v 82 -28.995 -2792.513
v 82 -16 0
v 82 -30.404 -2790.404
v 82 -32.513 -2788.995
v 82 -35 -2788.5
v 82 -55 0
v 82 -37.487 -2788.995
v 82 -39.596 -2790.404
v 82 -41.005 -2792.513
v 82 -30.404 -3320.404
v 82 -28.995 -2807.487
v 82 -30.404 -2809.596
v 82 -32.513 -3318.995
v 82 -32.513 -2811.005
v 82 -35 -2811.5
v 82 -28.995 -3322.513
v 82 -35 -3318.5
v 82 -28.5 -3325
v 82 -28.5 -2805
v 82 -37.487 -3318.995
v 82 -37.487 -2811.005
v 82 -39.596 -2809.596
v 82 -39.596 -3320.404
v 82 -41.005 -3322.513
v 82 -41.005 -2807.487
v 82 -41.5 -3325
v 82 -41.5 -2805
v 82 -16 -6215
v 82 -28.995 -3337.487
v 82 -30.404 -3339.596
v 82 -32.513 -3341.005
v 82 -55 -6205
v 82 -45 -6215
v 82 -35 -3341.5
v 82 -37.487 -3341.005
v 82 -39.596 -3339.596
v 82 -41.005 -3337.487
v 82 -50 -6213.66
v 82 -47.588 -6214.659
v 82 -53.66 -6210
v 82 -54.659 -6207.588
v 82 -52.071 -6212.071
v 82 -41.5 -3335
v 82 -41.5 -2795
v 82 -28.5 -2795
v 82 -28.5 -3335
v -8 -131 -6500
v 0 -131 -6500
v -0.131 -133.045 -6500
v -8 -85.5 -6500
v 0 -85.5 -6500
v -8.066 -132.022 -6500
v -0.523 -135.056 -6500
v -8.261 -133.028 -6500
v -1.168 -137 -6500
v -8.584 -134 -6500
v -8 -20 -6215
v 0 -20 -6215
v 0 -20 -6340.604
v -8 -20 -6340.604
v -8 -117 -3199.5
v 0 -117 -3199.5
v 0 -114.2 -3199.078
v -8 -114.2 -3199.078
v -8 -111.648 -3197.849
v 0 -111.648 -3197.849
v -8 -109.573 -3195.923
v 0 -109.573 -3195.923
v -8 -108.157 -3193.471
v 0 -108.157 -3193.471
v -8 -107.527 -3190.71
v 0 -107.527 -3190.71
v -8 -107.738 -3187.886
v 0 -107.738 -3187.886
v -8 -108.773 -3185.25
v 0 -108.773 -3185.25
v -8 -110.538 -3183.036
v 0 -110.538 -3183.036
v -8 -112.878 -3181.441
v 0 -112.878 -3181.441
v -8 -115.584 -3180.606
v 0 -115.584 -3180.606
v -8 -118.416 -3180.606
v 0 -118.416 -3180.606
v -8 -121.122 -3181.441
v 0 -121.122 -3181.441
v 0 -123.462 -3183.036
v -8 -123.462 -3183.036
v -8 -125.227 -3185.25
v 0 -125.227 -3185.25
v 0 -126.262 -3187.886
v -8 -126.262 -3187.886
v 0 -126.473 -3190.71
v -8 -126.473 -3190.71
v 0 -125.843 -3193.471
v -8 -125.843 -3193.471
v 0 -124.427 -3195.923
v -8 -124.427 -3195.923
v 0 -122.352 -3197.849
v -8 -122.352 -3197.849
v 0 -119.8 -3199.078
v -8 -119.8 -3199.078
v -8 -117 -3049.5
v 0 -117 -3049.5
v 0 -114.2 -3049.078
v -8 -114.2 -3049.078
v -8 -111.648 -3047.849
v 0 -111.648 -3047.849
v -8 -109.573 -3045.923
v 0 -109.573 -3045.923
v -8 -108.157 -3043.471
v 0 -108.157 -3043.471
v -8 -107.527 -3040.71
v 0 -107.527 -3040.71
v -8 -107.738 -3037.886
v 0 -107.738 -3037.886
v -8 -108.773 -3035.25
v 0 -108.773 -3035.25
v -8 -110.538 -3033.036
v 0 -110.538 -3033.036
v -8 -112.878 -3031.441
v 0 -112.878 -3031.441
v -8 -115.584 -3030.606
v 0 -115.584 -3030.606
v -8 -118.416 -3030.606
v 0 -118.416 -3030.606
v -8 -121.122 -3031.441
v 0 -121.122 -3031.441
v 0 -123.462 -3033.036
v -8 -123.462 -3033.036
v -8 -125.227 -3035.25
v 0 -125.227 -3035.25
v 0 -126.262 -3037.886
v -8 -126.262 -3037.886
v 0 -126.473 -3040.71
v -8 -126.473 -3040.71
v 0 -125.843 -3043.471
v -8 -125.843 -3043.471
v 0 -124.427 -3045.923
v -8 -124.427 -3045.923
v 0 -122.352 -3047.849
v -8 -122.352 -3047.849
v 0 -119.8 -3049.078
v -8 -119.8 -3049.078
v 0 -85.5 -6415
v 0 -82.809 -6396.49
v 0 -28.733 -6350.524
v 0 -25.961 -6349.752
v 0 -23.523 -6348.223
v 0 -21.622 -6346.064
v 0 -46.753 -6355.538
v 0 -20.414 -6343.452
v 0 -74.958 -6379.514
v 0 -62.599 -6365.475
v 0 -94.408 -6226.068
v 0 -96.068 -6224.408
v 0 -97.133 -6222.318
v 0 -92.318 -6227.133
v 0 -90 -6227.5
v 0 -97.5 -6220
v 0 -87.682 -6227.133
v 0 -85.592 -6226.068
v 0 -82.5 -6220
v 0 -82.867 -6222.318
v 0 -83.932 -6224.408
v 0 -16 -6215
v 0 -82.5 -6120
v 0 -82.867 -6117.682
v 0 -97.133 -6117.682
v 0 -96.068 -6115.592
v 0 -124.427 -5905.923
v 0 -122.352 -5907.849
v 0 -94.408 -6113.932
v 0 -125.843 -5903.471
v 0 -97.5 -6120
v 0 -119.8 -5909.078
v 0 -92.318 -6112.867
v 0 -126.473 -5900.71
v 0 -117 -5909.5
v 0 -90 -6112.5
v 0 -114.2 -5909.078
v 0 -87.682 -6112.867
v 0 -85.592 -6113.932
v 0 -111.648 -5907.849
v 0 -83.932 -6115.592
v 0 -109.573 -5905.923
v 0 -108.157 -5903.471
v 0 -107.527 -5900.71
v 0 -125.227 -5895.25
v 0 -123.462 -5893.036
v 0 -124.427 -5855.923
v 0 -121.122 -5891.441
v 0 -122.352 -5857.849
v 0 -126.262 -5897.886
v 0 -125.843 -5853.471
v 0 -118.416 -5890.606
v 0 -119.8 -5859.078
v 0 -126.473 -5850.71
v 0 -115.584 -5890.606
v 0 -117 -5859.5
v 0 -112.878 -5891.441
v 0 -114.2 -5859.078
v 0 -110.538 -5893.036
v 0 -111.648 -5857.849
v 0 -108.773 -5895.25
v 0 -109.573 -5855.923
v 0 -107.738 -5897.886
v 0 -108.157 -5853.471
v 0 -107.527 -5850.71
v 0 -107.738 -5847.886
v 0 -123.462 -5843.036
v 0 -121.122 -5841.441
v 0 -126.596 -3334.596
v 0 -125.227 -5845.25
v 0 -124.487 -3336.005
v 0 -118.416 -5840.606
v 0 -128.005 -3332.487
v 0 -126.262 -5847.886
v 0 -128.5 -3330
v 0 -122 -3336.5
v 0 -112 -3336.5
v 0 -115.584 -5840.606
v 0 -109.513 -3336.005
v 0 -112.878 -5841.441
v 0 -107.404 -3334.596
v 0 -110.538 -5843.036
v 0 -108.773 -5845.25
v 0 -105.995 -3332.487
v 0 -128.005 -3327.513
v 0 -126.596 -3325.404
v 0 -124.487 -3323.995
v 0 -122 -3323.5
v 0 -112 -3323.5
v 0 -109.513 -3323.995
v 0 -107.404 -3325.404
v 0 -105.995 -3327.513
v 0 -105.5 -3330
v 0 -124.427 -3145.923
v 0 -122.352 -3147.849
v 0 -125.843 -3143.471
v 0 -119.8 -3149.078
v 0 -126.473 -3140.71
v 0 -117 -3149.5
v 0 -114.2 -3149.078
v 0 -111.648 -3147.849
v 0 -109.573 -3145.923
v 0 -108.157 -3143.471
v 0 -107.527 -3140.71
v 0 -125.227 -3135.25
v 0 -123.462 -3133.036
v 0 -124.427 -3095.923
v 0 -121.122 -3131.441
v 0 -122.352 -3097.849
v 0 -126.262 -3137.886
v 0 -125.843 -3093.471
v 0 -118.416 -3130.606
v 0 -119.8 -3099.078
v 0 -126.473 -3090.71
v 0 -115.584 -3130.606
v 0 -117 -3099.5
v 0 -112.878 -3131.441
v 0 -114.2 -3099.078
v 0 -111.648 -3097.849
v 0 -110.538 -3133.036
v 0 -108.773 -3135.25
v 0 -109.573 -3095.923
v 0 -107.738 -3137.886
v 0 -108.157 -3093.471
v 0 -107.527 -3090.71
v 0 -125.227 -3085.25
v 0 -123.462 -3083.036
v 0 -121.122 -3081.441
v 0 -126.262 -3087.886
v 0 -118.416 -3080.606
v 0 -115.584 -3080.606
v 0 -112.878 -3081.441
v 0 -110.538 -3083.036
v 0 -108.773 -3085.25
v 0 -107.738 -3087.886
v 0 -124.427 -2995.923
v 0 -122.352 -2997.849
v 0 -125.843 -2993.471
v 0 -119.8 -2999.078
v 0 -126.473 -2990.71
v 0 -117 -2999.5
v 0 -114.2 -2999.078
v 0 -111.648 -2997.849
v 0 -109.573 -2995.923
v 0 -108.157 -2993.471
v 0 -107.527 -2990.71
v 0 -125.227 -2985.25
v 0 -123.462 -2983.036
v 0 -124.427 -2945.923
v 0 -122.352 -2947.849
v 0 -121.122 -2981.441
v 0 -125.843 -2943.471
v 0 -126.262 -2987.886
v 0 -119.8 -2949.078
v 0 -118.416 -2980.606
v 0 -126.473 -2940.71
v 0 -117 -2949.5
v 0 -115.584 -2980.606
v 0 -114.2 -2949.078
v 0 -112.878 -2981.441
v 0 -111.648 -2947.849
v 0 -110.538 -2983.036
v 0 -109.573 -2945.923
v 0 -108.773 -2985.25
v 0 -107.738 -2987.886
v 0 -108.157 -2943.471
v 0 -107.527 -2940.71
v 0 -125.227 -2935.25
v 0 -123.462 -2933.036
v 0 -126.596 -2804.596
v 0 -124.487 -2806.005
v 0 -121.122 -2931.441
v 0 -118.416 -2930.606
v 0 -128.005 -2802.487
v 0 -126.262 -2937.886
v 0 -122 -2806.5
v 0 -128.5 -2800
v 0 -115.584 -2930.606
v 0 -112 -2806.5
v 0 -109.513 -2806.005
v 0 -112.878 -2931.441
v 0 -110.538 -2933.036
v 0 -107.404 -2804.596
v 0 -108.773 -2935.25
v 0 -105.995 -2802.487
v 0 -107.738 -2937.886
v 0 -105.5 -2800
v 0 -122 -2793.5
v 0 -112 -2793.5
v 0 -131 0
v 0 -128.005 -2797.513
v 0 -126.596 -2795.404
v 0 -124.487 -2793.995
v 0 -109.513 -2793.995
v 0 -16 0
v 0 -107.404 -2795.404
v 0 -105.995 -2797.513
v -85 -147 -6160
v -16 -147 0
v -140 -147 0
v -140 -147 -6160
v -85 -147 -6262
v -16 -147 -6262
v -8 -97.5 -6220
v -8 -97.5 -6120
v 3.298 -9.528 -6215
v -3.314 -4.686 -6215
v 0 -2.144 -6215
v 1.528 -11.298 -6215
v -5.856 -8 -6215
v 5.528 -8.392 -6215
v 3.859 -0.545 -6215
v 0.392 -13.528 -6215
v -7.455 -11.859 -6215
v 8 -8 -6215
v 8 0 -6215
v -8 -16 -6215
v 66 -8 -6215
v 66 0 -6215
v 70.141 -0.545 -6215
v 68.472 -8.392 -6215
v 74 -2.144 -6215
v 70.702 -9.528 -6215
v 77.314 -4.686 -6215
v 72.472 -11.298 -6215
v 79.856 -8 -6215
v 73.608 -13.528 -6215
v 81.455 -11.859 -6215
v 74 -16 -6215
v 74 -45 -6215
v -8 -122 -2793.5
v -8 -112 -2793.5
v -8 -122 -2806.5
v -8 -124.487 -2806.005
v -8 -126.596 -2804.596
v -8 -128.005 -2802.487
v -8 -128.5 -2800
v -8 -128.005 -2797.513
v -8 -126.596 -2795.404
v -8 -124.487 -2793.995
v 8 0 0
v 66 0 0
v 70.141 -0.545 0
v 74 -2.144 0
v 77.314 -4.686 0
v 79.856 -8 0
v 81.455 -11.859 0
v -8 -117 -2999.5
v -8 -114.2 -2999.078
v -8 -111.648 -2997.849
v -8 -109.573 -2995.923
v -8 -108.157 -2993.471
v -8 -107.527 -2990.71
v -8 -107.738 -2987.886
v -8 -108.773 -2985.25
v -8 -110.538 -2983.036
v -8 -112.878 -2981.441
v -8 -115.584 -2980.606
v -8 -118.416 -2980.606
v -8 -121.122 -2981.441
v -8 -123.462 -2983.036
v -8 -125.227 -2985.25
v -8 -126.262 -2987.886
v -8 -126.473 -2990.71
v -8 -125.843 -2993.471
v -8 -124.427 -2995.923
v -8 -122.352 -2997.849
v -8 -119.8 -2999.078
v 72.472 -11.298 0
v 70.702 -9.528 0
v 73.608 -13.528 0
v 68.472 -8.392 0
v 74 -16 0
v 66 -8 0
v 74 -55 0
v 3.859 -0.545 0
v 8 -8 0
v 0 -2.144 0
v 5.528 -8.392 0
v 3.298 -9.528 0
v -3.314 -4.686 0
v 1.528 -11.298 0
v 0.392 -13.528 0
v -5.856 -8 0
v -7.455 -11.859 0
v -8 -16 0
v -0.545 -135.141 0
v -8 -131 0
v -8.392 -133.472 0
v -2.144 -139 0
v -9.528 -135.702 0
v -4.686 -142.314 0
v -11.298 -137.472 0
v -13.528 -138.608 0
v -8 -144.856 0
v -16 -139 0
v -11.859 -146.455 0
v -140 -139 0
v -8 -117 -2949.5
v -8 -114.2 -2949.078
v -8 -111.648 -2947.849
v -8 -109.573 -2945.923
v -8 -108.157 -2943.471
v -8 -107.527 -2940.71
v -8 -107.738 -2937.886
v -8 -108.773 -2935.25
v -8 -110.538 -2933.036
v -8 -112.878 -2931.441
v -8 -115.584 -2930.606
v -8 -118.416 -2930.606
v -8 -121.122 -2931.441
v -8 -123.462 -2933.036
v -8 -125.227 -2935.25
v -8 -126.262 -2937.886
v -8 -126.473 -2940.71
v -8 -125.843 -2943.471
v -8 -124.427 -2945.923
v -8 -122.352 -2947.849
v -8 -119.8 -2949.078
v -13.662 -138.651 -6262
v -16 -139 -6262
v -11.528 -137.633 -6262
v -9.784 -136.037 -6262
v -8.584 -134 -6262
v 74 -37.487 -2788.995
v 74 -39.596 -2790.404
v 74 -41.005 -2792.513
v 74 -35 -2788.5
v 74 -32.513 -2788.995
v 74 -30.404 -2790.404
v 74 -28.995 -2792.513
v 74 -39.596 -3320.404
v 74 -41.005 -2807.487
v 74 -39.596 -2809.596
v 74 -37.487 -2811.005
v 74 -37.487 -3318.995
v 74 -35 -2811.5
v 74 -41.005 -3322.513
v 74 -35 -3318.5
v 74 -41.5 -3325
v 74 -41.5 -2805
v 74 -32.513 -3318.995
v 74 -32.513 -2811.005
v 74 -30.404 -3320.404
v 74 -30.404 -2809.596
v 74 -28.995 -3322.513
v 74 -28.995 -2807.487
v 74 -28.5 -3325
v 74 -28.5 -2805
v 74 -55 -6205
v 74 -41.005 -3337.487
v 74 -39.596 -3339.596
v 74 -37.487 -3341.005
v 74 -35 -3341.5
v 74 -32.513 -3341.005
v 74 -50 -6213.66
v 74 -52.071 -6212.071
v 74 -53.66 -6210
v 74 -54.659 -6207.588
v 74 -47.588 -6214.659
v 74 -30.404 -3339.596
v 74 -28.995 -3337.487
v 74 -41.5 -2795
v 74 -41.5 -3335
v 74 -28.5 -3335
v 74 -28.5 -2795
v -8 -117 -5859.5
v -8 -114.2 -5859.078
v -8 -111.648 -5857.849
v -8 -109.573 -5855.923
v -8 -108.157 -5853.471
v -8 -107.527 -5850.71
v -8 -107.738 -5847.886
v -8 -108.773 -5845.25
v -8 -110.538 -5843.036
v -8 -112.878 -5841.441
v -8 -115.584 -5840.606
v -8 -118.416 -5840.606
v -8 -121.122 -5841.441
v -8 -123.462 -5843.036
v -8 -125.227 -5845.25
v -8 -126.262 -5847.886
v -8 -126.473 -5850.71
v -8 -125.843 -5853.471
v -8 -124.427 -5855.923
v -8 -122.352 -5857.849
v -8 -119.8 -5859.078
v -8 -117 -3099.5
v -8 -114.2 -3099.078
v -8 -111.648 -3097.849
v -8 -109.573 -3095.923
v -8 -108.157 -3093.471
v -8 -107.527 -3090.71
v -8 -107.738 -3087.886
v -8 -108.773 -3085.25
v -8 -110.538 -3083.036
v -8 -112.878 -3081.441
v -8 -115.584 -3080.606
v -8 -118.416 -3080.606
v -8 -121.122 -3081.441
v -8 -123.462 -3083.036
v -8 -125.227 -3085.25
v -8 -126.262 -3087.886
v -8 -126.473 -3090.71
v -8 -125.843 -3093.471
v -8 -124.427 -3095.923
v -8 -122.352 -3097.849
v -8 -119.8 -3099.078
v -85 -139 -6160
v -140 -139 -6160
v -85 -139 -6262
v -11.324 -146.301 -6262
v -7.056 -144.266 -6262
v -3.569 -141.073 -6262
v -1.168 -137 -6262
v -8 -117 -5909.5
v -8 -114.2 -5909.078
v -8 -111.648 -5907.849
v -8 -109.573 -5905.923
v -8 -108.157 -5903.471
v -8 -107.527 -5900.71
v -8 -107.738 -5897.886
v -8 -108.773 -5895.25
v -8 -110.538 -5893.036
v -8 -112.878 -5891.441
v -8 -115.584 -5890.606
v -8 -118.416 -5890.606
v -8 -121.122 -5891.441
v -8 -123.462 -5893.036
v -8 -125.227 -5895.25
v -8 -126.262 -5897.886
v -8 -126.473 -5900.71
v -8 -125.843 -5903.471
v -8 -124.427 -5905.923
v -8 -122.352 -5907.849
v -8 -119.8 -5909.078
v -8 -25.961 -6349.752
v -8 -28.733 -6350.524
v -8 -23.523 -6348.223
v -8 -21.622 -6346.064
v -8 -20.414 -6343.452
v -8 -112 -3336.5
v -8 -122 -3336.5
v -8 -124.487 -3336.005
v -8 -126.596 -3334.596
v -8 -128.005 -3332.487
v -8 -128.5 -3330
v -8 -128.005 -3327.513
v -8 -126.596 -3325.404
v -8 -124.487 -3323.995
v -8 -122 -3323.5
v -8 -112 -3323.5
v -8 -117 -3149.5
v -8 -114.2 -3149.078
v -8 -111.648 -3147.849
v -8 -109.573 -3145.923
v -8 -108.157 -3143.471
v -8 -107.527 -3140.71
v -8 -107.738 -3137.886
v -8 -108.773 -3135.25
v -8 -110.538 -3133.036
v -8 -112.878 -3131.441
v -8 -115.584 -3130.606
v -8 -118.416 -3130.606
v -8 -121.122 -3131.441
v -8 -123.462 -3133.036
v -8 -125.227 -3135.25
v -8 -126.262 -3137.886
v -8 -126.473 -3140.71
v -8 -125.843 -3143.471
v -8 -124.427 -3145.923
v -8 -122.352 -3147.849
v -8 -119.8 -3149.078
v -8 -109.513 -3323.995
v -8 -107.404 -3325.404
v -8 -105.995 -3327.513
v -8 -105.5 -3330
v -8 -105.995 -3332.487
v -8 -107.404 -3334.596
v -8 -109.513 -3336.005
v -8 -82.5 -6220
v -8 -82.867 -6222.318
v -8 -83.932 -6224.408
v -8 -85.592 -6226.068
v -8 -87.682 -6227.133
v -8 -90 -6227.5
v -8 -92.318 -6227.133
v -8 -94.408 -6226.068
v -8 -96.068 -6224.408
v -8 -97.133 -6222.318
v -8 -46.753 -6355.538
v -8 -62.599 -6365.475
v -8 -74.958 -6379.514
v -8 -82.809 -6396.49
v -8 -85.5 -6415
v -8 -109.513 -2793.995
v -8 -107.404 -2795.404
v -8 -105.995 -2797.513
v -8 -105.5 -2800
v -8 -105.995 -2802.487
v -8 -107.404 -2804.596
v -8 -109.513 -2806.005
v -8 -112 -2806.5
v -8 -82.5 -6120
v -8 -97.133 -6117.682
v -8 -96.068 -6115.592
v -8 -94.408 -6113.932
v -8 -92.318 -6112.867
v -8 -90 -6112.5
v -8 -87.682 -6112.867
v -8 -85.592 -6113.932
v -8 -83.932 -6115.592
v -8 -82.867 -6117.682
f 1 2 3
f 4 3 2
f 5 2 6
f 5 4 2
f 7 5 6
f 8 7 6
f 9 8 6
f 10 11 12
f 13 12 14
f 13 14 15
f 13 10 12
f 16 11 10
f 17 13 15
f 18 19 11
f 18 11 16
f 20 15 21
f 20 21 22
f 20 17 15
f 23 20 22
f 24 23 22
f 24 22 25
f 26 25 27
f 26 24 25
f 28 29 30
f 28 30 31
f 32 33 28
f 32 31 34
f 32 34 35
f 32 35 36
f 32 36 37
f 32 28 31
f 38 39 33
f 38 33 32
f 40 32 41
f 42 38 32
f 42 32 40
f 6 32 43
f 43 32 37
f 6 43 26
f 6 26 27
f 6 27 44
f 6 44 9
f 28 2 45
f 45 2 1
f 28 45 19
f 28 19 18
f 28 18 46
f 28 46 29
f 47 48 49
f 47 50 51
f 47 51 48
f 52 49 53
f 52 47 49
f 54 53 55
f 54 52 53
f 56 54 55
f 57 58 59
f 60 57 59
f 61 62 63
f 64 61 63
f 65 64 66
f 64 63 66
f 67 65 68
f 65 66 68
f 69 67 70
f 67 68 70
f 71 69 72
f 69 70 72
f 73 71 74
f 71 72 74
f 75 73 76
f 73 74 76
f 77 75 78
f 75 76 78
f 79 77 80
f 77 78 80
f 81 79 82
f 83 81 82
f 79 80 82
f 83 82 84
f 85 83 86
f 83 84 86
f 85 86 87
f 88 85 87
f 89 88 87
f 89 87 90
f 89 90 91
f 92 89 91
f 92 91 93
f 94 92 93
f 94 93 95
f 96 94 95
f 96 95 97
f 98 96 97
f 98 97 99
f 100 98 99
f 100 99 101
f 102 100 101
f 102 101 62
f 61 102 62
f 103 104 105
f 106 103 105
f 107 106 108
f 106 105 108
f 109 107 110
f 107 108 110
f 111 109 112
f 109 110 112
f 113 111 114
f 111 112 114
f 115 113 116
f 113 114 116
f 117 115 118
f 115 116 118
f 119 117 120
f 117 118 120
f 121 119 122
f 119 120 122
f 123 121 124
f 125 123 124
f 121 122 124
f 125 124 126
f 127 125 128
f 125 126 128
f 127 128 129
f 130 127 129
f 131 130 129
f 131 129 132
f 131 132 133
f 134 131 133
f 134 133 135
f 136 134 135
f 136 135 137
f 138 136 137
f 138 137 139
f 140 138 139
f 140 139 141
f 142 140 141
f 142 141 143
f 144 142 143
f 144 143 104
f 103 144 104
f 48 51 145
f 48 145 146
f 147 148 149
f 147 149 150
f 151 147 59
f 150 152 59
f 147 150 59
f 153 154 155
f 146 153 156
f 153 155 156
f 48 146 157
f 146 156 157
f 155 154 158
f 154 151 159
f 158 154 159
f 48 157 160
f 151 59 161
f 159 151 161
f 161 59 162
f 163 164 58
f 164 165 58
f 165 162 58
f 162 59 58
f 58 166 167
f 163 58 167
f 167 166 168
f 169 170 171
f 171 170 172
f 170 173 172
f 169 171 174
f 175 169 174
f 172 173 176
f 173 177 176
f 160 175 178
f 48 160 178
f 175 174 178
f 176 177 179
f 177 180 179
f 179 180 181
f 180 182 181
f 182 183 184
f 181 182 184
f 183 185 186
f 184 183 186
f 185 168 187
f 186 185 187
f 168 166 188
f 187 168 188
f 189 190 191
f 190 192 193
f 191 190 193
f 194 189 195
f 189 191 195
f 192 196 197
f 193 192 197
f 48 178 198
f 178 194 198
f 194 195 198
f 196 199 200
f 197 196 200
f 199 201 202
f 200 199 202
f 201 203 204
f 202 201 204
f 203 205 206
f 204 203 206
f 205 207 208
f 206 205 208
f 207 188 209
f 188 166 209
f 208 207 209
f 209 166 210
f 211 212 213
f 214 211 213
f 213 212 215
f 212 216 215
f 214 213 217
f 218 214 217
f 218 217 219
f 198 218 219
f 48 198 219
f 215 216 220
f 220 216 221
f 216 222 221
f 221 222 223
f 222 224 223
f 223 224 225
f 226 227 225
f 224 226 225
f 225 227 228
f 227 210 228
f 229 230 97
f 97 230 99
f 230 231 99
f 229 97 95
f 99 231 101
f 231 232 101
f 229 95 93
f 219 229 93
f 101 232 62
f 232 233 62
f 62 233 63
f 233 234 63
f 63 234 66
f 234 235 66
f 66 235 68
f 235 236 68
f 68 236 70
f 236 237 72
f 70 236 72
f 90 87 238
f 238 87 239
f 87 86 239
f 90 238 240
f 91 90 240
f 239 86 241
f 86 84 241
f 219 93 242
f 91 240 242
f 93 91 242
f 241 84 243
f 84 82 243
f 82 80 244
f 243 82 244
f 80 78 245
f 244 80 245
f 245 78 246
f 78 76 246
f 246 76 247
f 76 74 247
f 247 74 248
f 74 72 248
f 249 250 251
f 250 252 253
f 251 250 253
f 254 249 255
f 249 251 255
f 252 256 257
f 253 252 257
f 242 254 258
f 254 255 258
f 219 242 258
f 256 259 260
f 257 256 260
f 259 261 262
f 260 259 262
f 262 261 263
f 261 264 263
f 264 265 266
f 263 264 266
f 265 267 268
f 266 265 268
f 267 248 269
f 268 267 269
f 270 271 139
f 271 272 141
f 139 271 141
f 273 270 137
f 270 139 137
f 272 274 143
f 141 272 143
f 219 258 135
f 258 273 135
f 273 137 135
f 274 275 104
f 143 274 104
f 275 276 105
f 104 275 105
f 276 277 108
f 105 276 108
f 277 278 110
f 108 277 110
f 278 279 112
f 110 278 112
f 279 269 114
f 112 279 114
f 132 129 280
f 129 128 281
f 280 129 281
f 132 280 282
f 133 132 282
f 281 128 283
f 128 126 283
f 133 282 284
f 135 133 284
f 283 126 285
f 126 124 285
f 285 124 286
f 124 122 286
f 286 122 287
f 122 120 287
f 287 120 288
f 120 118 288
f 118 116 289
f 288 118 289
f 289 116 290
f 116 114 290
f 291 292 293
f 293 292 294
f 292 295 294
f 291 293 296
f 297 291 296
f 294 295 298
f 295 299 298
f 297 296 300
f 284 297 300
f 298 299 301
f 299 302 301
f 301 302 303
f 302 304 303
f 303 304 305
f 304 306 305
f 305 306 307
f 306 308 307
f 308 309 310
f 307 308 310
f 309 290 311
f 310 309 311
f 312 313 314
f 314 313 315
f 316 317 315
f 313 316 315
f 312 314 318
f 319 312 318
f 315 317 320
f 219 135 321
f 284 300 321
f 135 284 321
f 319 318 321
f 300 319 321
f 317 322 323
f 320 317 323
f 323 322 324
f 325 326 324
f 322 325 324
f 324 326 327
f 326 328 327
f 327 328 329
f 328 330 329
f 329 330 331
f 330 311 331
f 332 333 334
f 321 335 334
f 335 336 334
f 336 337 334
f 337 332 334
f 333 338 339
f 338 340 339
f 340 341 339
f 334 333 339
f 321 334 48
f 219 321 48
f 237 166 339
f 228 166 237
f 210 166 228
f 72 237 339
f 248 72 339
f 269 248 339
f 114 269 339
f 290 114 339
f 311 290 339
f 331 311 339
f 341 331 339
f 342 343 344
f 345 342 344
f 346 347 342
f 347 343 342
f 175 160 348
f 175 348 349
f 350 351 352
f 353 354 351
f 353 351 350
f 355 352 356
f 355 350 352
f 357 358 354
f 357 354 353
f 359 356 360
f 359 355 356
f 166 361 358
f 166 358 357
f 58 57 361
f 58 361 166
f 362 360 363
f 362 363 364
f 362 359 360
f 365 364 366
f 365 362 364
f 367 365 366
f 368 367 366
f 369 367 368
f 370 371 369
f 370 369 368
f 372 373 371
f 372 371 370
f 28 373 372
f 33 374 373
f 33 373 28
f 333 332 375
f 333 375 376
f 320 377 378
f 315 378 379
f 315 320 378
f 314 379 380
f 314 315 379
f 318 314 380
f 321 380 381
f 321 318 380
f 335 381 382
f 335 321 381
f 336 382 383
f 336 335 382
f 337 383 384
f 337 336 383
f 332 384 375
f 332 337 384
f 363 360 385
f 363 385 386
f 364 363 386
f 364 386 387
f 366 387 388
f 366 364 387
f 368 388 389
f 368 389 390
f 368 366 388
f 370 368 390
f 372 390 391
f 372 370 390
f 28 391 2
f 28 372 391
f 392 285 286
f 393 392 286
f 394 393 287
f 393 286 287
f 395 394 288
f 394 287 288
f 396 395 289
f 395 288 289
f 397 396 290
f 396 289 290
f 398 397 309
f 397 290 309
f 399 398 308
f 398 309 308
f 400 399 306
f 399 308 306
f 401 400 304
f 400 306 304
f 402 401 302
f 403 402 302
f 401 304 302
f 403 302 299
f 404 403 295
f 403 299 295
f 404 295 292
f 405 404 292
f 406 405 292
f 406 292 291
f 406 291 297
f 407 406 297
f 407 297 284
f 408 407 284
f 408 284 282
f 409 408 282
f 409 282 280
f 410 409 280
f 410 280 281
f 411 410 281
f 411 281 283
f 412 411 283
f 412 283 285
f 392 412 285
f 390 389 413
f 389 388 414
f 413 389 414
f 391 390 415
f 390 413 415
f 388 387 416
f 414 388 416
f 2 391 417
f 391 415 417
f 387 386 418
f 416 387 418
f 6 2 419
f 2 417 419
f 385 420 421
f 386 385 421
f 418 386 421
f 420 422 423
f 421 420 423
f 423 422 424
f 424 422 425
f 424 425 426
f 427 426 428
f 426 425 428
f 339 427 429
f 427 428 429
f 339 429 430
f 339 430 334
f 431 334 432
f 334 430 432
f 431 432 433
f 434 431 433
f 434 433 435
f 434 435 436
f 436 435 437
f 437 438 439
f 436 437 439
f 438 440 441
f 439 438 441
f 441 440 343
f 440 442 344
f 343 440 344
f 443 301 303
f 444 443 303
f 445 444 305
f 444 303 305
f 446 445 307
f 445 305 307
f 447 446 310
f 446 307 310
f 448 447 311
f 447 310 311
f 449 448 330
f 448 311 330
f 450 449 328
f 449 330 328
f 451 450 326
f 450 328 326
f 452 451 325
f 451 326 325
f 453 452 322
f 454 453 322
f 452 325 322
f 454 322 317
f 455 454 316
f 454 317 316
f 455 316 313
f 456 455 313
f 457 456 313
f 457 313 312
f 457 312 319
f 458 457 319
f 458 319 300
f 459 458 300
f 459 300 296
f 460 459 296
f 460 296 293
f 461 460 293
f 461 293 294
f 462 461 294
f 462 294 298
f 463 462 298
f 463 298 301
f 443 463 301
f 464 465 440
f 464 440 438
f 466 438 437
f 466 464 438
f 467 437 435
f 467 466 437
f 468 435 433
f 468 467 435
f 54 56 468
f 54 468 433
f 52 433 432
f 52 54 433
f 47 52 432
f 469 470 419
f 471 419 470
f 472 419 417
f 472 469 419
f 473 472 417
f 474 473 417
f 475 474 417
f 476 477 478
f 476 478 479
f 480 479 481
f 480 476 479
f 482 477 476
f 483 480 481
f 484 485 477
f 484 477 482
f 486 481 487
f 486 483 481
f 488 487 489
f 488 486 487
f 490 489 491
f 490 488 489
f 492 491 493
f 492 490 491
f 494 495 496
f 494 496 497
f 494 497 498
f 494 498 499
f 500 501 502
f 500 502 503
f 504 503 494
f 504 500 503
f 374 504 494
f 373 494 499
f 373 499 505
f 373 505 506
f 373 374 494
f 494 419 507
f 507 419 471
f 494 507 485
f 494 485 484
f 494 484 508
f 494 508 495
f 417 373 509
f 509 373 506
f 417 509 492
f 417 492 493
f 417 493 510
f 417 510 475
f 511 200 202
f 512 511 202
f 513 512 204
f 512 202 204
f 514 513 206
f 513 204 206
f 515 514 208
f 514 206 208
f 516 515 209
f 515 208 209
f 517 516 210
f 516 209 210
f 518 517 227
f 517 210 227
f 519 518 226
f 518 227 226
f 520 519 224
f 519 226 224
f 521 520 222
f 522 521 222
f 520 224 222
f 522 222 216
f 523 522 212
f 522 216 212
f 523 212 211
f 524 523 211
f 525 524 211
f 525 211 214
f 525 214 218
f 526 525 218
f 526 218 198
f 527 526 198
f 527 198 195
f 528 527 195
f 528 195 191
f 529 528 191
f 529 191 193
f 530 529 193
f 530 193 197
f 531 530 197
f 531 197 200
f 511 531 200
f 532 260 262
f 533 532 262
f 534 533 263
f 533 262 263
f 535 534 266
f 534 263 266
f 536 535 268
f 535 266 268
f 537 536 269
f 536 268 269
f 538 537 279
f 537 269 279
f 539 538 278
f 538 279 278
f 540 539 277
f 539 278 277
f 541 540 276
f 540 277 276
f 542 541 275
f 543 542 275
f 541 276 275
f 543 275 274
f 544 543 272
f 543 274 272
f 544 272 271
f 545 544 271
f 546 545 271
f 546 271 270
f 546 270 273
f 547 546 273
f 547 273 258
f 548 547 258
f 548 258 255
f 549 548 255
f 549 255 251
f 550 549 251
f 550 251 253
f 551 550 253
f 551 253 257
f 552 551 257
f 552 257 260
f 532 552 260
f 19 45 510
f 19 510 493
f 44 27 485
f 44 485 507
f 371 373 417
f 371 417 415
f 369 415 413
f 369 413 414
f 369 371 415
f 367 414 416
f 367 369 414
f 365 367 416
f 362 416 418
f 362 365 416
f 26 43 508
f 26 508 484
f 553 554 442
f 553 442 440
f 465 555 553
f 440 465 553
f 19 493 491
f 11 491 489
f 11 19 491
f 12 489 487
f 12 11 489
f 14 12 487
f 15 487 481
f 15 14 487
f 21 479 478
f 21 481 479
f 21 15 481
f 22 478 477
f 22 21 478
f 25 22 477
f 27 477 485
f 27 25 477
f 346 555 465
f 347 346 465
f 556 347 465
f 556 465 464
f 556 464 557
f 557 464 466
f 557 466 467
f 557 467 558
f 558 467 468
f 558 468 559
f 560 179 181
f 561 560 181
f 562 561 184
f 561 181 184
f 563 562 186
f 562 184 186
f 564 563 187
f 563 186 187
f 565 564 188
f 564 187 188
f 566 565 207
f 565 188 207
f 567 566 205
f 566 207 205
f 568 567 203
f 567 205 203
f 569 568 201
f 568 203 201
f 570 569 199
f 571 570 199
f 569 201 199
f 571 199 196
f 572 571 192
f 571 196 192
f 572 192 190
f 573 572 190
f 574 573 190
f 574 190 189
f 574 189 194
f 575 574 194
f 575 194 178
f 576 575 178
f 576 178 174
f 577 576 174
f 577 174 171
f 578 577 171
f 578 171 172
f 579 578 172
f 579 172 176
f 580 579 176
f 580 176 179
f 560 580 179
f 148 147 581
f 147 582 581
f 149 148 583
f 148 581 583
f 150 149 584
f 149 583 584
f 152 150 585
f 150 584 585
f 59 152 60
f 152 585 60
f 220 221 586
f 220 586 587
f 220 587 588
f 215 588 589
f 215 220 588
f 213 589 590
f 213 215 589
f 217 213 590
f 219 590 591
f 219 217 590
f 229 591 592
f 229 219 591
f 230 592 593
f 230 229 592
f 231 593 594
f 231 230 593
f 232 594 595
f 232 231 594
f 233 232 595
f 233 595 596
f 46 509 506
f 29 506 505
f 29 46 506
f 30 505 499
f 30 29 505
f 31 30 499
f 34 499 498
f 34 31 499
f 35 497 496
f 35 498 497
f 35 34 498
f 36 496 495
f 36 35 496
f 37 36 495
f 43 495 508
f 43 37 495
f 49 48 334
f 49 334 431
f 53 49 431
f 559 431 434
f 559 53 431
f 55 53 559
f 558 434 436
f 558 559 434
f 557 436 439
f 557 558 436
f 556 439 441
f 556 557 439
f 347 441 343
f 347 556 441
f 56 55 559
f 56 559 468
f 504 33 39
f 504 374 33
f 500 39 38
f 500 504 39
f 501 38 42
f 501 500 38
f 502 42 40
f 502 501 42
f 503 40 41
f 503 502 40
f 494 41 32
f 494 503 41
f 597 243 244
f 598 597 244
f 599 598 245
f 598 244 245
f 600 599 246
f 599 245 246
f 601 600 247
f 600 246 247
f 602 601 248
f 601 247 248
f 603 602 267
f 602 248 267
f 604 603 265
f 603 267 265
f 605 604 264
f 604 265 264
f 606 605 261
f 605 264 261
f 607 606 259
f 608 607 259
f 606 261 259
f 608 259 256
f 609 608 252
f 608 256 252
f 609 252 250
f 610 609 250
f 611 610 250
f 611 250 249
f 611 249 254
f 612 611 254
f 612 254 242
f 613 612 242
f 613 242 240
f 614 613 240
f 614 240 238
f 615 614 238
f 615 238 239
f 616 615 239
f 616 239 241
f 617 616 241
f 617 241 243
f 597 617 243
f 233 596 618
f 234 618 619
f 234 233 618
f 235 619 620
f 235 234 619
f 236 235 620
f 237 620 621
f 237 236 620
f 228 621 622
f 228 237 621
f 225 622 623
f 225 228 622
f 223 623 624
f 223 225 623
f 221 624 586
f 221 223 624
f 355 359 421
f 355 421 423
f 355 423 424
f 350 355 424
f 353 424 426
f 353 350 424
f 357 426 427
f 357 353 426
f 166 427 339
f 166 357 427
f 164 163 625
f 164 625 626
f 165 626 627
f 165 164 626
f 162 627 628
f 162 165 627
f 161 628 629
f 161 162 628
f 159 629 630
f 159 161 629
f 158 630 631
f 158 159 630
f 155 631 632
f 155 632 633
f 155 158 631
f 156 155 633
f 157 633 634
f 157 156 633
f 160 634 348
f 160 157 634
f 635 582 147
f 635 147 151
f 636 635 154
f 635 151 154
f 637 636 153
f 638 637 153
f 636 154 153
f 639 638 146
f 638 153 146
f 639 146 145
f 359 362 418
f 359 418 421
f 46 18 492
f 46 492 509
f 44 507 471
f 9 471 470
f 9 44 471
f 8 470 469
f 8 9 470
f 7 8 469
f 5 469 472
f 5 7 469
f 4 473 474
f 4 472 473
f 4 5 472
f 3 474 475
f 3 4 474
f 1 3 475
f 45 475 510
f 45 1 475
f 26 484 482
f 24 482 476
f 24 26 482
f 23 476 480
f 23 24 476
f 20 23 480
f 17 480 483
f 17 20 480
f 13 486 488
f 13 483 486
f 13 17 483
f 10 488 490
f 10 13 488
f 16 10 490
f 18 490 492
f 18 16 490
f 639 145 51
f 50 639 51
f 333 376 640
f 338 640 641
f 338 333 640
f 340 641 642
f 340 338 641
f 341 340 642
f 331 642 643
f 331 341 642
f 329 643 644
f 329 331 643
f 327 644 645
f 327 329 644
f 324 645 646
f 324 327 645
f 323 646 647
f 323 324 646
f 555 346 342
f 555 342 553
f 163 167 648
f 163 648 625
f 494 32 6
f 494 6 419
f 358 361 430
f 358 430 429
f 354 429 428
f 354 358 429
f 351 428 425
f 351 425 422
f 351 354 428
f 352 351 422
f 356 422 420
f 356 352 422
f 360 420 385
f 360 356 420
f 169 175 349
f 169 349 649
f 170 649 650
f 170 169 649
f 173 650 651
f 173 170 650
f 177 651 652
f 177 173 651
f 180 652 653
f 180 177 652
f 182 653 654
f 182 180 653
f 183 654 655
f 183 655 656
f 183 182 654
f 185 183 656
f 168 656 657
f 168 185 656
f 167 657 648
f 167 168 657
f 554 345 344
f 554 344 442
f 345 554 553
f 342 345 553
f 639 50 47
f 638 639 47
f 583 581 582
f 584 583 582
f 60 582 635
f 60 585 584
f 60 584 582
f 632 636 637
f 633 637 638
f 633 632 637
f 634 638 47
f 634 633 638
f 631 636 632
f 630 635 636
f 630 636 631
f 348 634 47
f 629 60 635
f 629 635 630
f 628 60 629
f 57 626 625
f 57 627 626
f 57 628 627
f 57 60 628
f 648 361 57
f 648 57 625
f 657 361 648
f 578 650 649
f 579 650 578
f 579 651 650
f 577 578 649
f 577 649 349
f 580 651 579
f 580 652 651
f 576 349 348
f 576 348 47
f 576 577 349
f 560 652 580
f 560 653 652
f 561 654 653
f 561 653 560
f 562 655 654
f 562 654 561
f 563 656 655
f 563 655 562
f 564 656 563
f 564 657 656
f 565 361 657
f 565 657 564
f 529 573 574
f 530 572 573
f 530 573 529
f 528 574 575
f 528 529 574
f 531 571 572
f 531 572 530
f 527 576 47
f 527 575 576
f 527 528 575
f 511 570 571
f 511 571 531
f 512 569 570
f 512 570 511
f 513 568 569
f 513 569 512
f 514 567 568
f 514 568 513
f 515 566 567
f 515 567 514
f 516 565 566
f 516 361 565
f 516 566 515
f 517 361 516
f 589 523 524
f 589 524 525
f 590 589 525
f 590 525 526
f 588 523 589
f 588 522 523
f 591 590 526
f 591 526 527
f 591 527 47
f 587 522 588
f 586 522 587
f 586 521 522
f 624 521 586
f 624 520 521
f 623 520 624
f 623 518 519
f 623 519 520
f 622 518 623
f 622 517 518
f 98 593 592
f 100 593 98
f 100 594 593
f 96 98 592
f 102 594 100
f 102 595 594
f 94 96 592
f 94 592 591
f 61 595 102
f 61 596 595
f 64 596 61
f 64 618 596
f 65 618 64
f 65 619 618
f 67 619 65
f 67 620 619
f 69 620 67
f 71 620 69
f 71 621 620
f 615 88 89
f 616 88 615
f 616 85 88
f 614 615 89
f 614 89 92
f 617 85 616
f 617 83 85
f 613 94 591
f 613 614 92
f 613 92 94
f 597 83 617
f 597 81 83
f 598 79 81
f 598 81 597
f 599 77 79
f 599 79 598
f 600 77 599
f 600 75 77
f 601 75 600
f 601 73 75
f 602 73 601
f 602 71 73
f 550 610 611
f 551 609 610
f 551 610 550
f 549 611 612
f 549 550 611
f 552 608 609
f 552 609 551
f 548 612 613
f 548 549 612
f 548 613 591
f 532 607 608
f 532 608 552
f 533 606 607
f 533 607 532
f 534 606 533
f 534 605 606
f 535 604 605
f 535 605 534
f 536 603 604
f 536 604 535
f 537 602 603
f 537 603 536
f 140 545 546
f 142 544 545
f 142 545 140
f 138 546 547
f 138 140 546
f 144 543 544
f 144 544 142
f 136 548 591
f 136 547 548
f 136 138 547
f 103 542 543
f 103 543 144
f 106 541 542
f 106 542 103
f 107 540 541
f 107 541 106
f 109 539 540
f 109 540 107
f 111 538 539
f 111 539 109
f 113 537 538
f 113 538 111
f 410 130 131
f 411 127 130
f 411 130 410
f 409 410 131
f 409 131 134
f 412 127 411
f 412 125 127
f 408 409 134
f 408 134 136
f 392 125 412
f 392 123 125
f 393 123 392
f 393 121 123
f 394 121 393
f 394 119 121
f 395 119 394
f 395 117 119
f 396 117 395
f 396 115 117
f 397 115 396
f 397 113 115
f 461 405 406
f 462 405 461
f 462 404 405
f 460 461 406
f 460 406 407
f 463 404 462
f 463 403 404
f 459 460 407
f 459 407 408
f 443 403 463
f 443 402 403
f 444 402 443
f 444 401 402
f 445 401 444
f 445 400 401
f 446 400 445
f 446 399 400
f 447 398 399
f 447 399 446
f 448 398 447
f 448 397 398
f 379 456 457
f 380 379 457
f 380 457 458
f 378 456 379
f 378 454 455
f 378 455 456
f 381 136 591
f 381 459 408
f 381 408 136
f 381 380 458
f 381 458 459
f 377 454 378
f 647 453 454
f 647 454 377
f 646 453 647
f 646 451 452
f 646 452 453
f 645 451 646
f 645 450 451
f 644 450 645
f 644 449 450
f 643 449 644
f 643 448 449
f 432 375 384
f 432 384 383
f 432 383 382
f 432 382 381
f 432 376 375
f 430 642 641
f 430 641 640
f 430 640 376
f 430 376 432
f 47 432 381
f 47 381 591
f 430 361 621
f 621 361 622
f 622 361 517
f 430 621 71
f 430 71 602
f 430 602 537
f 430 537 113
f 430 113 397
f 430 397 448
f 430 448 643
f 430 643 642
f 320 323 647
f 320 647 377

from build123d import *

# Parameters (mm, degrees)
SM_BASE_FLANGE_1_DEPTH           = 8
SM_EDGE_FLANGE_1_STRIP_W         = 48
SM_EDGE_FLANGE_1_STRIP_H         = 8
SM_EDGE_FLANGE_1_STRIP_CUT_DEPTH = 6215
SM_EDGE_FLANGE_1_DEPTH           = 6215
SM_EDGE_FLANGE_2_STRIP_W         = 48
SM_EDGE_FLANGE_2_STRIP_H         = 8
SM_EDGE_FLANGE_2_STRIP_CUT_DEPTH = 6215
SM_EDGE_FLANGE_2_DEPTH           = 6215
SM_EDGE_FLANGE_3_STRIP_W         = 48
SM_EDGE_FLANGE_3_STRIP_H         = 8
SM_EDGE_FLANGE_3_STRIP_CUT_DEPTH = 6500
SM_EDGE_FLANGE_3_DEPTH           = 6500
FILLET_1_R                       = 10
SKETCH_15_R                      = 9.5
CUT_EXTRUDE_1_DEPTH              = 6504.169150499
CUT_EXTRUDE_2_DEPTH              = 10
SKETCH_17_R                      = 9.5
CUT_EXTRUDE_3_DEPTH              = 10
CUT_EXTRUDE_START                = -6500
CUT_EXTRUDE_4_DEPTH              = 238
CUT_EXTRUDE_START_2              = -6262
CUT_EXTRUDE_4_2_OUTLINE_W        = 55
CUT_EXTRUDE_4_2_OUTLINE_H        = 8
CUT_EXTRUDE_4_2_DEPTH            = 102


# Read off the part's stored shape, not the designer's step: 切除-拉伸4
# Sheet-metal steps are written as plain solids
with BuildPart() as part:
    # Sketch 1 → 基体-法兰1 (new body)
    with BuildSketch(Plane(origin=(0, 0, 0), x_dir=(0, 0, -1), z_dir=(1, 0, 0))):
        with BuildLine():
            Line((0, 0), (6215, 0))
            Line((6215, 0), (6215, -20))
            Line((6215, -20), (6350.001923105, -20))
            ThreePointArc((6350.001923105, -20), (6368.861621181, -66.284822813), (6415, -85.5))
            Line((6415, -85.5), (6500, -85.5))
            Line((6500, -85.5), (6500, -147))
            Line((6500, -147), (0, -147))
            Line((0, -147), (0, 0))
        make_face()
        with BuildLine():
            Line((6120, -82.5), (6220, -82.5))
            ThreePointArc((6220, -82.5), (6227.5, -90), (6220, -97.5))
            Line((6220, -97.5), (6120, -97.5))
            ThreePointArc((6120, -97.5), (6112.5, -90), (6120, -82.5))
        make_face(mode=Mode.SUBTRACT)
    extrude(amount=-SM_BASE_FLANGE_1_DEPTH)

    # 边线-法兰1 strip (across the edge) → 边线-法兰1 strip cut (cut)
    with BuildSketch(Plane(origin=(0, 0, -6215), x_dir=(0, -1, 0), z_dir=(0, 0, 1))):
        with Locations((-8, -4)):
            Rectangle(SM_EDGE_FLANGE_1_STRIP_W, SM_EDGE_FLANGE_1_STRIP_H)
    extrude(amount=SM_EDGE_FLANGE_1_STRIP_CUT_DEPTH, mode=Mode.SUBTRACT)

    # 边线-法兰1 section (across the edge) → 边线-法兰1 (add)
    with BuildSketch(Plane(origin=(0, 0, -6215), x_dir=(0, -1, 0), z_dir=(0, 0, 1))):
        with BuildLine():
            Line((0, 8), (0, 74))
            Line((0, 74), (8, 74))
            Line((8, 74), (8, 8))
            ThreePointArc((8, 8), (10.343145751, 2.343145751), (16, 0))
            Line((16, 0), (16, -8))
            ThreePointArc((16, -8), (4.686291501, -3.313708499), (0, 8))
        make_face()
    extrude(amount=SM_EDGE_FLANGE_1_DEPTH)

    # 边线-法兰2 strip (across the edge) → 边线-法兰2 strip cut (cut)
    with BuildSketch(Plane(origin=(74, -8, -6215), x_dir=(-1, 0, 0), z_dir=(0, 0, 1))):
        with Locations((-16, -4)):
            Rectangle(SM_EDGE_FLANGE_2_STRIP_W, SM_EDGE_FLANGE_2_STRIP_H)
    extrude(amount=SM_EDGE_FLANGE_2_STRIP_CUT_DEPTH, mode=Mode.SUBTRACT)

    # 边线-法兰2 section (across the edge) → 边线-法兰2 (add)
    with BuildSketch(Plane(origin=(74, -8, -6215), x_dir=(-1, 0, 0), z_dir=(0, 0, 1))):
        with BuildLine():
            Line((-8, 8), (-8, 47))
            Line((-8, 47), (0, 47))
            Line((0, 47), (0, 8))
            ThreePointArc((0, 8), (2.343145751, 2.343145751), (8, 0))
            Line((8, 0), (8, -8))
            ThreePointArc((8, -8), (-3.313708499, -3.313708499), (-8, 8))
        make_face()
    extrude(amount=SM_EDGE_FLANGE_2_DEPTH)

    # 边线-法兰3 strip (across the edge) → 边线-法兰3 strip cut (cut)
    with BuildSketch(Plane(origin=(-8, -147, -6500), x_dir=(0, 1, 0), z_dir=(0, 0, 1))):
        with Locations((-8, -4)):
            Rectangle(SM_EDGE_FLANGE_3_STRIP_W, SM_EDGE_FLANGE_3_STRIP_H)
    extrude(amount=SM_EDGE_FLANGE_3_STRIP_CUT_DEPTH, mode=Mode.SUBTRACT)

    # 边线-法兰3 section (across the edge) → 边线-法兰3 (add)
    with BuildSketch(Plane(origin=(-8, -147, -6500), x_dir=(0, 1, 0), z_dir=(0, 0, 1))):
        with BuildLine():
            Line((0, 8), (0, 132))
            Line((0, 132), (8, 132))
            Line((8, 132), (8, 8))
            ThreePointArc((8, 8), (10.343145751, 2.343145751), (16, 0))
            Line((16, 0), (16, -8))
            ThreePointArc((16, -8), (4.686291501, -3.313708499), (0, 8))
        make_face()
    extrude(amount=SM_EDGE_FLANGE_3_DEPTH)

    # 圆角1
    fillet_1_edges = [part.edges().sort_by_distance(p)[0] for p in [
        (78, -55, -6215),
        (-4, -20, -6350.001923105),
    ]]
    fillet(fillet_1_edges, radius=FILLET_1_R)

    # 草图15 → 切除-拉伸1 (cut, through all)
    with BuildSketch(Plane(origin=(0, 0, 0), x_dir=(0, 0, -1), z_dir=(1, 0, 0))):
        with Locations((3040, -117)):
            Circle(SKETCH_15_R)
        with Locations((3090, -117)):
            Circle(SKETCH_15_R)
        with Locations((3140, -117)):
            Circle(SKETCH_15_R)
        with Locations((3190, -117)):
            Circle(SKETCH_15_R)
        with Locations((2990, -117)):
            Circle(SKETCH_15_R)
        with Locations((2940, -117)):
            Circle(SKETCH_15_R)
        with BuildLine():
            Line((2806.5, -112), (2806.5, -122))
            ThreePointArc((2806.5, -122), (2800, -128.5), (2793.5, -122))
            Line((2793.5, -122), (2793.5, -112))
            ThreePointArc((2793.5, -112), (2800, -105.5), (2806.5, -112))
        make_face()
        with BuildLine():
            Line((3336.5, -112), (3336.5, -122))
            ThreePointArc((3336.5, -122), (3330, -128.5), (3323.5, -122))
            Line((3323.5, -122), (3323.5, -112))
            ThreePointArc((3323.5, -112), (3330, -105.5), (3336.5, -112))
        make_face()
    extrude(amount=-CUT_EXTRUDE_1_DEPTH, mode=Mode.SUBTRACT)

    # 草图16 → 切除-拉伸2 (cut)
    with BuildSketch(Plane(origin=(82, 0, 0), x_dir=(0, 0, -1), z_dir=(1, 0, 0))):
        with BuildLine():
            Line((2795, -28.5), (2805, -28.5))
            ThreePointArc((2805, -28.5), (2811.5, -35), (2805, -41.5))
            Line((2805, -41.5), (2795, -41.5))
            ThreePointArc((2795, -41.5), (2788.5, -35), (2795, -28.5))
        make_face()
        with BuildLine():
            Line((3325, -28.5), (3335, -28.5))
            ThreePointArc((3335, -28.5), (3341.5, -35), (3335, -41.5))
            Line((3335, -41.5), (3325, -41.5))
            ThreePointArc((3325, -41.5), (3318.5, -35), (3325, -28.5))
        make_face()
    extrude(amount=-CUT_EXTRUDE_2_DEPTH, mode=Mode.SUBTRACT)

    # 草图17 → 切除-拉伸3 (cut)
    with BuildSketch(Plane(origin=(0, 0, 0), x_dir=(0, 0, -1), z_dir=(1, 0, 0))):
        with Locations((5900, -117)):
            Circle(SKETCH_17_R)
        with Locations((5850, -117)):
            Circle(SKETCH_17_R)
    extrude(amount=-CUT_EXTRUDE_3_DEPTH, mode=Mode.SUBTRACT)

    # 切除-拉伸4 outline → 切除-拉伸4 (cut)
    with BuildSketch(Plane.XY.offset(CUT_EXTRUDE_START)):
        with BuildLine():
            Line((-140, -147), (-16, -147))
            ThreePointArc((-16, -147), (-7.05572809, -144.266499161), (-1.167603026, -137))
            Line((-1.167603026, -137), (-8.583801513, -134))
            ThreePointArc((-8.583801513, -134), (-11.527864045, -137.63324958), (-16, -139))
            Line((-16, -139), (-140, -139))
            Line((-140, -139), (-140, -147))
        make_face()
    extrude(amount=CUT_EXTRUDE_4_DEPTH, mode=Mode.SUBTRACT)

    # Cut-Extrude 4 2 outline → Cut-Extrude 4 2 (cut)
    with BuildSketch(Plane.XY.offset(CUT_EXTRUDE_START_2)):
        with Locations((-112.5, -143)):
            Rectangle(CUT_EXTRUDE_4_2_OUTLINE_W, CUT_EXTRUDE_4_2_OUTLINE_H)
    extrude(amount=CUT_EXTRUDE_4_2_DEPTH, mode=Mode.SUBTRACT)


solid = part.part
